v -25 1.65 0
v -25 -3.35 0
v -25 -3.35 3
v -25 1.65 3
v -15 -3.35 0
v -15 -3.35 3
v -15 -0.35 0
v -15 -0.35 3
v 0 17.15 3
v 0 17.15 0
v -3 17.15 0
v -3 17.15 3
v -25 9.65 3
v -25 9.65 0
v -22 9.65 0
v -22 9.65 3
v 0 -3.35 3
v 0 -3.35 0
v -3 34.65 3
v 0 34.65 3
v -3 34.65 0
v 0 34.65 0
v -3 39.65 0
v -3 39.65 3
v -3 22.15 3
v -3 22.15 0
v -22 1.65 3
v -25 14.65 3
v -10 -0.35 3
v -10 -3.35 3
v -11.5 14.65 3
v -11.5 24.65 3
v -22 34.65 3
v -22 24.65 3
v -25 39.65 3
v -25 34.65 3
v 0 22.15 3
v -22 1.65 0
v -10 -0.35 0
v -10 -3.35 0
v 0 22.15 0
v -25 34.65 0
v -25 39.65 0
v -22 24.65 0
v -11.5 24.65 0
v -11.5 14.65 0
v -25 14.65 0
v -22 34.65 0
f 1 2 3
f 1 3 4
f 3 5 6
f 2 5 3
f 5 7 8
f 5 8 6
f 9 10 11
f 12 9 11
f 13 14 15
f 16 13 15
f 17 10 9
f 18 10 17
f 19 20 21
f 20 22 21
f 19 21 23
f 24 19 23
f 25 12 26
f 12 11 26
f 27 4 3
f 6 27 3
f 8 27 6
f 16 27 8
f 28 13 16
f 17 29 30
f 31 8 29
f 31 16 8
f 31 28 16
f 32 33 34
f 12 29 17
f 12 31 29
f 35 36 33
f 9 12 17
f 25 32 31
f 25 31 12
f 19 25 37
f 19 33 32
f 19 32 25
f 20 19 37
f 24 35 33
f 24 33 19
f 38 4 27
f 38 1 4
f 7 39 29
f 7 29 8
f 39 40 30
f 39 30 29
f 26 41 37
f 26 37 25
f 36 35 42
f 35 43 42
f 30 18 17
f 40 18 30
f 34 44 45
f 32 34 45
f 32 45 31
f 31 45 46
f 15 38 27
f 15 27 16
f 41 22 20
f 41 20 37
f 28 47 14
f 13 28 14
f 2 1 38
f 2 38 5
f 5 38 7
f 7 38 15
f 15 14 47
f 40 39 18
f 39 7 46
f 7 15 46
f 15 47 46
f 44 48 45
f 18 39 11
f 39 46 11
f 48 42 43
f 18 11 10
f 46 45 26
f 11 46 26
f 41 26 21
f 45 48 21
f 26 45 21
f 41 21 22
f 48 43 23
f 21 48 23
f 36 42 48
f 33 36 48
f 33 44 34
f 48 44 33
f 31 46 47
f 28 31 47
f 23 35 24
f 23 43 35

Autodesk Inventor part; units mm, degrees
ref_plane "YZ Plane" through (0, 0, 0) normal (1, 0, 0) x (0, 1, 0)
ref_plane "XZ Plane" through (0, 0, 0) normal (0, 1, 0) x (-1, 0, 0)
ref_plane "XY Plane" through (0, 0, 0) normal (0, 0, 1) x (1, 0, 0)
sketch "Sketch1" plane through (0, 0, 0) normal (0, 0, 1) x (1, 0, 0)
  line L0 (-3, 22.15) -> (-3, 34.65) projected
  line L1 (-3, 17.15) -> (-3, 22.15) projected
  line L2 (-3, -3.35) -> (-3, 17.15) projected
  line L3 (0, -3.35) -> (-3, -3.35) projected
  line L4 (0, 17.15) -> (0, -3.35) projected
  line L5 (0, 17.15) -> (-3, 17.15) projected
  line L6 (-3, 34.65) -> (-3, 39.65) projected
  line L7 (-3, -3.35) -> (-22, -3.35)
  line L8 (-22, -3.35) -> (-22, 39.65)
  line L9 (-22, 39.65) -> (-3, 39.65)
  line L10 (-22, 39.65) -> (-25, 39.65)
  line L11 (-25, 39.65) -> (-25, 34.65)
  line L12 (-25, 34.65) -> (-22, 34.65)
  line L13 (-22, 34.65) -> (-22, 39.65)
  line L14 (-22, 24.65) -> (-11.5, 24.65)
  line L15 (-11.5, 24.65) -> (-11.5, 14.65)
  line L16 (-11.5, 14.65) -> (-22, 14.65)
  line L17 (-22, 14.65) -> (-25, 14.65)
  line L18 (-25, 14.65) -> (-25, 9.65)
  line L19 (-25, 9.65) -> (-22, 9.65)
  line L20 (-22, 9.65) -> (-22, 14.65)
  line L21 (-22, -3.35) -> (-25, -3.35)
  line L22 (-25, -3.35) -> (-25, 1.65)
  line L23 (-25, 1.65) -> (-22, 1.65)
  line L24 (-22, 1.65) -> (-22, -3.35)
  line L25 (-15, -3.35) -> (-10, -3.35)
  line L26 (-10, -3.35) -> (-10, -0.35)
  line L27 (-10, -0.35) -> (-15, -0.35)
  line L28 (-15, -0.35) -> (-15, -3.35)
  line L29 (-3, 22.15) -> (-3, 34.65) projected
  line L30 (0, 22.15) -> (-3, 22.15) projected
  line L31 (0, 34.65) -> (0, 22.15) projected
  line L32 (0, 34.65) -> (-3, 34.65) projected
  point P0 (-11.5, 19.65)
  point P1 (-3, 19.65)
  point P2 (-12.5, -3.35)
  dimension "d1" = 19
  dimension "d2" = 3
  dimension "d3" = 5
  dimension "d4" = 10
  dimension "d8" = 3
  dimension "d9" = 5
  dimension "d10" = 3
  dimension "d11" = 5
  dimension "d12" = 5
  dimension "d13" = 3
  dimension "d16" = 8.5
extrude "Extrusion1" add sketch "Sketch1" along normal blind 3 contours L1 L2 L7 L26 L27 L28 L8 L16 L15 L14 L9 L6 L0 | L0 L32 L31 L30 | L5 L4 L3 L2 | L8 L12 L11 L10 | L21 L22 L23 L8 | L8 L19 L18 L17
properties part number "SideLeftTopNM" material "Acrylic, Clear"
